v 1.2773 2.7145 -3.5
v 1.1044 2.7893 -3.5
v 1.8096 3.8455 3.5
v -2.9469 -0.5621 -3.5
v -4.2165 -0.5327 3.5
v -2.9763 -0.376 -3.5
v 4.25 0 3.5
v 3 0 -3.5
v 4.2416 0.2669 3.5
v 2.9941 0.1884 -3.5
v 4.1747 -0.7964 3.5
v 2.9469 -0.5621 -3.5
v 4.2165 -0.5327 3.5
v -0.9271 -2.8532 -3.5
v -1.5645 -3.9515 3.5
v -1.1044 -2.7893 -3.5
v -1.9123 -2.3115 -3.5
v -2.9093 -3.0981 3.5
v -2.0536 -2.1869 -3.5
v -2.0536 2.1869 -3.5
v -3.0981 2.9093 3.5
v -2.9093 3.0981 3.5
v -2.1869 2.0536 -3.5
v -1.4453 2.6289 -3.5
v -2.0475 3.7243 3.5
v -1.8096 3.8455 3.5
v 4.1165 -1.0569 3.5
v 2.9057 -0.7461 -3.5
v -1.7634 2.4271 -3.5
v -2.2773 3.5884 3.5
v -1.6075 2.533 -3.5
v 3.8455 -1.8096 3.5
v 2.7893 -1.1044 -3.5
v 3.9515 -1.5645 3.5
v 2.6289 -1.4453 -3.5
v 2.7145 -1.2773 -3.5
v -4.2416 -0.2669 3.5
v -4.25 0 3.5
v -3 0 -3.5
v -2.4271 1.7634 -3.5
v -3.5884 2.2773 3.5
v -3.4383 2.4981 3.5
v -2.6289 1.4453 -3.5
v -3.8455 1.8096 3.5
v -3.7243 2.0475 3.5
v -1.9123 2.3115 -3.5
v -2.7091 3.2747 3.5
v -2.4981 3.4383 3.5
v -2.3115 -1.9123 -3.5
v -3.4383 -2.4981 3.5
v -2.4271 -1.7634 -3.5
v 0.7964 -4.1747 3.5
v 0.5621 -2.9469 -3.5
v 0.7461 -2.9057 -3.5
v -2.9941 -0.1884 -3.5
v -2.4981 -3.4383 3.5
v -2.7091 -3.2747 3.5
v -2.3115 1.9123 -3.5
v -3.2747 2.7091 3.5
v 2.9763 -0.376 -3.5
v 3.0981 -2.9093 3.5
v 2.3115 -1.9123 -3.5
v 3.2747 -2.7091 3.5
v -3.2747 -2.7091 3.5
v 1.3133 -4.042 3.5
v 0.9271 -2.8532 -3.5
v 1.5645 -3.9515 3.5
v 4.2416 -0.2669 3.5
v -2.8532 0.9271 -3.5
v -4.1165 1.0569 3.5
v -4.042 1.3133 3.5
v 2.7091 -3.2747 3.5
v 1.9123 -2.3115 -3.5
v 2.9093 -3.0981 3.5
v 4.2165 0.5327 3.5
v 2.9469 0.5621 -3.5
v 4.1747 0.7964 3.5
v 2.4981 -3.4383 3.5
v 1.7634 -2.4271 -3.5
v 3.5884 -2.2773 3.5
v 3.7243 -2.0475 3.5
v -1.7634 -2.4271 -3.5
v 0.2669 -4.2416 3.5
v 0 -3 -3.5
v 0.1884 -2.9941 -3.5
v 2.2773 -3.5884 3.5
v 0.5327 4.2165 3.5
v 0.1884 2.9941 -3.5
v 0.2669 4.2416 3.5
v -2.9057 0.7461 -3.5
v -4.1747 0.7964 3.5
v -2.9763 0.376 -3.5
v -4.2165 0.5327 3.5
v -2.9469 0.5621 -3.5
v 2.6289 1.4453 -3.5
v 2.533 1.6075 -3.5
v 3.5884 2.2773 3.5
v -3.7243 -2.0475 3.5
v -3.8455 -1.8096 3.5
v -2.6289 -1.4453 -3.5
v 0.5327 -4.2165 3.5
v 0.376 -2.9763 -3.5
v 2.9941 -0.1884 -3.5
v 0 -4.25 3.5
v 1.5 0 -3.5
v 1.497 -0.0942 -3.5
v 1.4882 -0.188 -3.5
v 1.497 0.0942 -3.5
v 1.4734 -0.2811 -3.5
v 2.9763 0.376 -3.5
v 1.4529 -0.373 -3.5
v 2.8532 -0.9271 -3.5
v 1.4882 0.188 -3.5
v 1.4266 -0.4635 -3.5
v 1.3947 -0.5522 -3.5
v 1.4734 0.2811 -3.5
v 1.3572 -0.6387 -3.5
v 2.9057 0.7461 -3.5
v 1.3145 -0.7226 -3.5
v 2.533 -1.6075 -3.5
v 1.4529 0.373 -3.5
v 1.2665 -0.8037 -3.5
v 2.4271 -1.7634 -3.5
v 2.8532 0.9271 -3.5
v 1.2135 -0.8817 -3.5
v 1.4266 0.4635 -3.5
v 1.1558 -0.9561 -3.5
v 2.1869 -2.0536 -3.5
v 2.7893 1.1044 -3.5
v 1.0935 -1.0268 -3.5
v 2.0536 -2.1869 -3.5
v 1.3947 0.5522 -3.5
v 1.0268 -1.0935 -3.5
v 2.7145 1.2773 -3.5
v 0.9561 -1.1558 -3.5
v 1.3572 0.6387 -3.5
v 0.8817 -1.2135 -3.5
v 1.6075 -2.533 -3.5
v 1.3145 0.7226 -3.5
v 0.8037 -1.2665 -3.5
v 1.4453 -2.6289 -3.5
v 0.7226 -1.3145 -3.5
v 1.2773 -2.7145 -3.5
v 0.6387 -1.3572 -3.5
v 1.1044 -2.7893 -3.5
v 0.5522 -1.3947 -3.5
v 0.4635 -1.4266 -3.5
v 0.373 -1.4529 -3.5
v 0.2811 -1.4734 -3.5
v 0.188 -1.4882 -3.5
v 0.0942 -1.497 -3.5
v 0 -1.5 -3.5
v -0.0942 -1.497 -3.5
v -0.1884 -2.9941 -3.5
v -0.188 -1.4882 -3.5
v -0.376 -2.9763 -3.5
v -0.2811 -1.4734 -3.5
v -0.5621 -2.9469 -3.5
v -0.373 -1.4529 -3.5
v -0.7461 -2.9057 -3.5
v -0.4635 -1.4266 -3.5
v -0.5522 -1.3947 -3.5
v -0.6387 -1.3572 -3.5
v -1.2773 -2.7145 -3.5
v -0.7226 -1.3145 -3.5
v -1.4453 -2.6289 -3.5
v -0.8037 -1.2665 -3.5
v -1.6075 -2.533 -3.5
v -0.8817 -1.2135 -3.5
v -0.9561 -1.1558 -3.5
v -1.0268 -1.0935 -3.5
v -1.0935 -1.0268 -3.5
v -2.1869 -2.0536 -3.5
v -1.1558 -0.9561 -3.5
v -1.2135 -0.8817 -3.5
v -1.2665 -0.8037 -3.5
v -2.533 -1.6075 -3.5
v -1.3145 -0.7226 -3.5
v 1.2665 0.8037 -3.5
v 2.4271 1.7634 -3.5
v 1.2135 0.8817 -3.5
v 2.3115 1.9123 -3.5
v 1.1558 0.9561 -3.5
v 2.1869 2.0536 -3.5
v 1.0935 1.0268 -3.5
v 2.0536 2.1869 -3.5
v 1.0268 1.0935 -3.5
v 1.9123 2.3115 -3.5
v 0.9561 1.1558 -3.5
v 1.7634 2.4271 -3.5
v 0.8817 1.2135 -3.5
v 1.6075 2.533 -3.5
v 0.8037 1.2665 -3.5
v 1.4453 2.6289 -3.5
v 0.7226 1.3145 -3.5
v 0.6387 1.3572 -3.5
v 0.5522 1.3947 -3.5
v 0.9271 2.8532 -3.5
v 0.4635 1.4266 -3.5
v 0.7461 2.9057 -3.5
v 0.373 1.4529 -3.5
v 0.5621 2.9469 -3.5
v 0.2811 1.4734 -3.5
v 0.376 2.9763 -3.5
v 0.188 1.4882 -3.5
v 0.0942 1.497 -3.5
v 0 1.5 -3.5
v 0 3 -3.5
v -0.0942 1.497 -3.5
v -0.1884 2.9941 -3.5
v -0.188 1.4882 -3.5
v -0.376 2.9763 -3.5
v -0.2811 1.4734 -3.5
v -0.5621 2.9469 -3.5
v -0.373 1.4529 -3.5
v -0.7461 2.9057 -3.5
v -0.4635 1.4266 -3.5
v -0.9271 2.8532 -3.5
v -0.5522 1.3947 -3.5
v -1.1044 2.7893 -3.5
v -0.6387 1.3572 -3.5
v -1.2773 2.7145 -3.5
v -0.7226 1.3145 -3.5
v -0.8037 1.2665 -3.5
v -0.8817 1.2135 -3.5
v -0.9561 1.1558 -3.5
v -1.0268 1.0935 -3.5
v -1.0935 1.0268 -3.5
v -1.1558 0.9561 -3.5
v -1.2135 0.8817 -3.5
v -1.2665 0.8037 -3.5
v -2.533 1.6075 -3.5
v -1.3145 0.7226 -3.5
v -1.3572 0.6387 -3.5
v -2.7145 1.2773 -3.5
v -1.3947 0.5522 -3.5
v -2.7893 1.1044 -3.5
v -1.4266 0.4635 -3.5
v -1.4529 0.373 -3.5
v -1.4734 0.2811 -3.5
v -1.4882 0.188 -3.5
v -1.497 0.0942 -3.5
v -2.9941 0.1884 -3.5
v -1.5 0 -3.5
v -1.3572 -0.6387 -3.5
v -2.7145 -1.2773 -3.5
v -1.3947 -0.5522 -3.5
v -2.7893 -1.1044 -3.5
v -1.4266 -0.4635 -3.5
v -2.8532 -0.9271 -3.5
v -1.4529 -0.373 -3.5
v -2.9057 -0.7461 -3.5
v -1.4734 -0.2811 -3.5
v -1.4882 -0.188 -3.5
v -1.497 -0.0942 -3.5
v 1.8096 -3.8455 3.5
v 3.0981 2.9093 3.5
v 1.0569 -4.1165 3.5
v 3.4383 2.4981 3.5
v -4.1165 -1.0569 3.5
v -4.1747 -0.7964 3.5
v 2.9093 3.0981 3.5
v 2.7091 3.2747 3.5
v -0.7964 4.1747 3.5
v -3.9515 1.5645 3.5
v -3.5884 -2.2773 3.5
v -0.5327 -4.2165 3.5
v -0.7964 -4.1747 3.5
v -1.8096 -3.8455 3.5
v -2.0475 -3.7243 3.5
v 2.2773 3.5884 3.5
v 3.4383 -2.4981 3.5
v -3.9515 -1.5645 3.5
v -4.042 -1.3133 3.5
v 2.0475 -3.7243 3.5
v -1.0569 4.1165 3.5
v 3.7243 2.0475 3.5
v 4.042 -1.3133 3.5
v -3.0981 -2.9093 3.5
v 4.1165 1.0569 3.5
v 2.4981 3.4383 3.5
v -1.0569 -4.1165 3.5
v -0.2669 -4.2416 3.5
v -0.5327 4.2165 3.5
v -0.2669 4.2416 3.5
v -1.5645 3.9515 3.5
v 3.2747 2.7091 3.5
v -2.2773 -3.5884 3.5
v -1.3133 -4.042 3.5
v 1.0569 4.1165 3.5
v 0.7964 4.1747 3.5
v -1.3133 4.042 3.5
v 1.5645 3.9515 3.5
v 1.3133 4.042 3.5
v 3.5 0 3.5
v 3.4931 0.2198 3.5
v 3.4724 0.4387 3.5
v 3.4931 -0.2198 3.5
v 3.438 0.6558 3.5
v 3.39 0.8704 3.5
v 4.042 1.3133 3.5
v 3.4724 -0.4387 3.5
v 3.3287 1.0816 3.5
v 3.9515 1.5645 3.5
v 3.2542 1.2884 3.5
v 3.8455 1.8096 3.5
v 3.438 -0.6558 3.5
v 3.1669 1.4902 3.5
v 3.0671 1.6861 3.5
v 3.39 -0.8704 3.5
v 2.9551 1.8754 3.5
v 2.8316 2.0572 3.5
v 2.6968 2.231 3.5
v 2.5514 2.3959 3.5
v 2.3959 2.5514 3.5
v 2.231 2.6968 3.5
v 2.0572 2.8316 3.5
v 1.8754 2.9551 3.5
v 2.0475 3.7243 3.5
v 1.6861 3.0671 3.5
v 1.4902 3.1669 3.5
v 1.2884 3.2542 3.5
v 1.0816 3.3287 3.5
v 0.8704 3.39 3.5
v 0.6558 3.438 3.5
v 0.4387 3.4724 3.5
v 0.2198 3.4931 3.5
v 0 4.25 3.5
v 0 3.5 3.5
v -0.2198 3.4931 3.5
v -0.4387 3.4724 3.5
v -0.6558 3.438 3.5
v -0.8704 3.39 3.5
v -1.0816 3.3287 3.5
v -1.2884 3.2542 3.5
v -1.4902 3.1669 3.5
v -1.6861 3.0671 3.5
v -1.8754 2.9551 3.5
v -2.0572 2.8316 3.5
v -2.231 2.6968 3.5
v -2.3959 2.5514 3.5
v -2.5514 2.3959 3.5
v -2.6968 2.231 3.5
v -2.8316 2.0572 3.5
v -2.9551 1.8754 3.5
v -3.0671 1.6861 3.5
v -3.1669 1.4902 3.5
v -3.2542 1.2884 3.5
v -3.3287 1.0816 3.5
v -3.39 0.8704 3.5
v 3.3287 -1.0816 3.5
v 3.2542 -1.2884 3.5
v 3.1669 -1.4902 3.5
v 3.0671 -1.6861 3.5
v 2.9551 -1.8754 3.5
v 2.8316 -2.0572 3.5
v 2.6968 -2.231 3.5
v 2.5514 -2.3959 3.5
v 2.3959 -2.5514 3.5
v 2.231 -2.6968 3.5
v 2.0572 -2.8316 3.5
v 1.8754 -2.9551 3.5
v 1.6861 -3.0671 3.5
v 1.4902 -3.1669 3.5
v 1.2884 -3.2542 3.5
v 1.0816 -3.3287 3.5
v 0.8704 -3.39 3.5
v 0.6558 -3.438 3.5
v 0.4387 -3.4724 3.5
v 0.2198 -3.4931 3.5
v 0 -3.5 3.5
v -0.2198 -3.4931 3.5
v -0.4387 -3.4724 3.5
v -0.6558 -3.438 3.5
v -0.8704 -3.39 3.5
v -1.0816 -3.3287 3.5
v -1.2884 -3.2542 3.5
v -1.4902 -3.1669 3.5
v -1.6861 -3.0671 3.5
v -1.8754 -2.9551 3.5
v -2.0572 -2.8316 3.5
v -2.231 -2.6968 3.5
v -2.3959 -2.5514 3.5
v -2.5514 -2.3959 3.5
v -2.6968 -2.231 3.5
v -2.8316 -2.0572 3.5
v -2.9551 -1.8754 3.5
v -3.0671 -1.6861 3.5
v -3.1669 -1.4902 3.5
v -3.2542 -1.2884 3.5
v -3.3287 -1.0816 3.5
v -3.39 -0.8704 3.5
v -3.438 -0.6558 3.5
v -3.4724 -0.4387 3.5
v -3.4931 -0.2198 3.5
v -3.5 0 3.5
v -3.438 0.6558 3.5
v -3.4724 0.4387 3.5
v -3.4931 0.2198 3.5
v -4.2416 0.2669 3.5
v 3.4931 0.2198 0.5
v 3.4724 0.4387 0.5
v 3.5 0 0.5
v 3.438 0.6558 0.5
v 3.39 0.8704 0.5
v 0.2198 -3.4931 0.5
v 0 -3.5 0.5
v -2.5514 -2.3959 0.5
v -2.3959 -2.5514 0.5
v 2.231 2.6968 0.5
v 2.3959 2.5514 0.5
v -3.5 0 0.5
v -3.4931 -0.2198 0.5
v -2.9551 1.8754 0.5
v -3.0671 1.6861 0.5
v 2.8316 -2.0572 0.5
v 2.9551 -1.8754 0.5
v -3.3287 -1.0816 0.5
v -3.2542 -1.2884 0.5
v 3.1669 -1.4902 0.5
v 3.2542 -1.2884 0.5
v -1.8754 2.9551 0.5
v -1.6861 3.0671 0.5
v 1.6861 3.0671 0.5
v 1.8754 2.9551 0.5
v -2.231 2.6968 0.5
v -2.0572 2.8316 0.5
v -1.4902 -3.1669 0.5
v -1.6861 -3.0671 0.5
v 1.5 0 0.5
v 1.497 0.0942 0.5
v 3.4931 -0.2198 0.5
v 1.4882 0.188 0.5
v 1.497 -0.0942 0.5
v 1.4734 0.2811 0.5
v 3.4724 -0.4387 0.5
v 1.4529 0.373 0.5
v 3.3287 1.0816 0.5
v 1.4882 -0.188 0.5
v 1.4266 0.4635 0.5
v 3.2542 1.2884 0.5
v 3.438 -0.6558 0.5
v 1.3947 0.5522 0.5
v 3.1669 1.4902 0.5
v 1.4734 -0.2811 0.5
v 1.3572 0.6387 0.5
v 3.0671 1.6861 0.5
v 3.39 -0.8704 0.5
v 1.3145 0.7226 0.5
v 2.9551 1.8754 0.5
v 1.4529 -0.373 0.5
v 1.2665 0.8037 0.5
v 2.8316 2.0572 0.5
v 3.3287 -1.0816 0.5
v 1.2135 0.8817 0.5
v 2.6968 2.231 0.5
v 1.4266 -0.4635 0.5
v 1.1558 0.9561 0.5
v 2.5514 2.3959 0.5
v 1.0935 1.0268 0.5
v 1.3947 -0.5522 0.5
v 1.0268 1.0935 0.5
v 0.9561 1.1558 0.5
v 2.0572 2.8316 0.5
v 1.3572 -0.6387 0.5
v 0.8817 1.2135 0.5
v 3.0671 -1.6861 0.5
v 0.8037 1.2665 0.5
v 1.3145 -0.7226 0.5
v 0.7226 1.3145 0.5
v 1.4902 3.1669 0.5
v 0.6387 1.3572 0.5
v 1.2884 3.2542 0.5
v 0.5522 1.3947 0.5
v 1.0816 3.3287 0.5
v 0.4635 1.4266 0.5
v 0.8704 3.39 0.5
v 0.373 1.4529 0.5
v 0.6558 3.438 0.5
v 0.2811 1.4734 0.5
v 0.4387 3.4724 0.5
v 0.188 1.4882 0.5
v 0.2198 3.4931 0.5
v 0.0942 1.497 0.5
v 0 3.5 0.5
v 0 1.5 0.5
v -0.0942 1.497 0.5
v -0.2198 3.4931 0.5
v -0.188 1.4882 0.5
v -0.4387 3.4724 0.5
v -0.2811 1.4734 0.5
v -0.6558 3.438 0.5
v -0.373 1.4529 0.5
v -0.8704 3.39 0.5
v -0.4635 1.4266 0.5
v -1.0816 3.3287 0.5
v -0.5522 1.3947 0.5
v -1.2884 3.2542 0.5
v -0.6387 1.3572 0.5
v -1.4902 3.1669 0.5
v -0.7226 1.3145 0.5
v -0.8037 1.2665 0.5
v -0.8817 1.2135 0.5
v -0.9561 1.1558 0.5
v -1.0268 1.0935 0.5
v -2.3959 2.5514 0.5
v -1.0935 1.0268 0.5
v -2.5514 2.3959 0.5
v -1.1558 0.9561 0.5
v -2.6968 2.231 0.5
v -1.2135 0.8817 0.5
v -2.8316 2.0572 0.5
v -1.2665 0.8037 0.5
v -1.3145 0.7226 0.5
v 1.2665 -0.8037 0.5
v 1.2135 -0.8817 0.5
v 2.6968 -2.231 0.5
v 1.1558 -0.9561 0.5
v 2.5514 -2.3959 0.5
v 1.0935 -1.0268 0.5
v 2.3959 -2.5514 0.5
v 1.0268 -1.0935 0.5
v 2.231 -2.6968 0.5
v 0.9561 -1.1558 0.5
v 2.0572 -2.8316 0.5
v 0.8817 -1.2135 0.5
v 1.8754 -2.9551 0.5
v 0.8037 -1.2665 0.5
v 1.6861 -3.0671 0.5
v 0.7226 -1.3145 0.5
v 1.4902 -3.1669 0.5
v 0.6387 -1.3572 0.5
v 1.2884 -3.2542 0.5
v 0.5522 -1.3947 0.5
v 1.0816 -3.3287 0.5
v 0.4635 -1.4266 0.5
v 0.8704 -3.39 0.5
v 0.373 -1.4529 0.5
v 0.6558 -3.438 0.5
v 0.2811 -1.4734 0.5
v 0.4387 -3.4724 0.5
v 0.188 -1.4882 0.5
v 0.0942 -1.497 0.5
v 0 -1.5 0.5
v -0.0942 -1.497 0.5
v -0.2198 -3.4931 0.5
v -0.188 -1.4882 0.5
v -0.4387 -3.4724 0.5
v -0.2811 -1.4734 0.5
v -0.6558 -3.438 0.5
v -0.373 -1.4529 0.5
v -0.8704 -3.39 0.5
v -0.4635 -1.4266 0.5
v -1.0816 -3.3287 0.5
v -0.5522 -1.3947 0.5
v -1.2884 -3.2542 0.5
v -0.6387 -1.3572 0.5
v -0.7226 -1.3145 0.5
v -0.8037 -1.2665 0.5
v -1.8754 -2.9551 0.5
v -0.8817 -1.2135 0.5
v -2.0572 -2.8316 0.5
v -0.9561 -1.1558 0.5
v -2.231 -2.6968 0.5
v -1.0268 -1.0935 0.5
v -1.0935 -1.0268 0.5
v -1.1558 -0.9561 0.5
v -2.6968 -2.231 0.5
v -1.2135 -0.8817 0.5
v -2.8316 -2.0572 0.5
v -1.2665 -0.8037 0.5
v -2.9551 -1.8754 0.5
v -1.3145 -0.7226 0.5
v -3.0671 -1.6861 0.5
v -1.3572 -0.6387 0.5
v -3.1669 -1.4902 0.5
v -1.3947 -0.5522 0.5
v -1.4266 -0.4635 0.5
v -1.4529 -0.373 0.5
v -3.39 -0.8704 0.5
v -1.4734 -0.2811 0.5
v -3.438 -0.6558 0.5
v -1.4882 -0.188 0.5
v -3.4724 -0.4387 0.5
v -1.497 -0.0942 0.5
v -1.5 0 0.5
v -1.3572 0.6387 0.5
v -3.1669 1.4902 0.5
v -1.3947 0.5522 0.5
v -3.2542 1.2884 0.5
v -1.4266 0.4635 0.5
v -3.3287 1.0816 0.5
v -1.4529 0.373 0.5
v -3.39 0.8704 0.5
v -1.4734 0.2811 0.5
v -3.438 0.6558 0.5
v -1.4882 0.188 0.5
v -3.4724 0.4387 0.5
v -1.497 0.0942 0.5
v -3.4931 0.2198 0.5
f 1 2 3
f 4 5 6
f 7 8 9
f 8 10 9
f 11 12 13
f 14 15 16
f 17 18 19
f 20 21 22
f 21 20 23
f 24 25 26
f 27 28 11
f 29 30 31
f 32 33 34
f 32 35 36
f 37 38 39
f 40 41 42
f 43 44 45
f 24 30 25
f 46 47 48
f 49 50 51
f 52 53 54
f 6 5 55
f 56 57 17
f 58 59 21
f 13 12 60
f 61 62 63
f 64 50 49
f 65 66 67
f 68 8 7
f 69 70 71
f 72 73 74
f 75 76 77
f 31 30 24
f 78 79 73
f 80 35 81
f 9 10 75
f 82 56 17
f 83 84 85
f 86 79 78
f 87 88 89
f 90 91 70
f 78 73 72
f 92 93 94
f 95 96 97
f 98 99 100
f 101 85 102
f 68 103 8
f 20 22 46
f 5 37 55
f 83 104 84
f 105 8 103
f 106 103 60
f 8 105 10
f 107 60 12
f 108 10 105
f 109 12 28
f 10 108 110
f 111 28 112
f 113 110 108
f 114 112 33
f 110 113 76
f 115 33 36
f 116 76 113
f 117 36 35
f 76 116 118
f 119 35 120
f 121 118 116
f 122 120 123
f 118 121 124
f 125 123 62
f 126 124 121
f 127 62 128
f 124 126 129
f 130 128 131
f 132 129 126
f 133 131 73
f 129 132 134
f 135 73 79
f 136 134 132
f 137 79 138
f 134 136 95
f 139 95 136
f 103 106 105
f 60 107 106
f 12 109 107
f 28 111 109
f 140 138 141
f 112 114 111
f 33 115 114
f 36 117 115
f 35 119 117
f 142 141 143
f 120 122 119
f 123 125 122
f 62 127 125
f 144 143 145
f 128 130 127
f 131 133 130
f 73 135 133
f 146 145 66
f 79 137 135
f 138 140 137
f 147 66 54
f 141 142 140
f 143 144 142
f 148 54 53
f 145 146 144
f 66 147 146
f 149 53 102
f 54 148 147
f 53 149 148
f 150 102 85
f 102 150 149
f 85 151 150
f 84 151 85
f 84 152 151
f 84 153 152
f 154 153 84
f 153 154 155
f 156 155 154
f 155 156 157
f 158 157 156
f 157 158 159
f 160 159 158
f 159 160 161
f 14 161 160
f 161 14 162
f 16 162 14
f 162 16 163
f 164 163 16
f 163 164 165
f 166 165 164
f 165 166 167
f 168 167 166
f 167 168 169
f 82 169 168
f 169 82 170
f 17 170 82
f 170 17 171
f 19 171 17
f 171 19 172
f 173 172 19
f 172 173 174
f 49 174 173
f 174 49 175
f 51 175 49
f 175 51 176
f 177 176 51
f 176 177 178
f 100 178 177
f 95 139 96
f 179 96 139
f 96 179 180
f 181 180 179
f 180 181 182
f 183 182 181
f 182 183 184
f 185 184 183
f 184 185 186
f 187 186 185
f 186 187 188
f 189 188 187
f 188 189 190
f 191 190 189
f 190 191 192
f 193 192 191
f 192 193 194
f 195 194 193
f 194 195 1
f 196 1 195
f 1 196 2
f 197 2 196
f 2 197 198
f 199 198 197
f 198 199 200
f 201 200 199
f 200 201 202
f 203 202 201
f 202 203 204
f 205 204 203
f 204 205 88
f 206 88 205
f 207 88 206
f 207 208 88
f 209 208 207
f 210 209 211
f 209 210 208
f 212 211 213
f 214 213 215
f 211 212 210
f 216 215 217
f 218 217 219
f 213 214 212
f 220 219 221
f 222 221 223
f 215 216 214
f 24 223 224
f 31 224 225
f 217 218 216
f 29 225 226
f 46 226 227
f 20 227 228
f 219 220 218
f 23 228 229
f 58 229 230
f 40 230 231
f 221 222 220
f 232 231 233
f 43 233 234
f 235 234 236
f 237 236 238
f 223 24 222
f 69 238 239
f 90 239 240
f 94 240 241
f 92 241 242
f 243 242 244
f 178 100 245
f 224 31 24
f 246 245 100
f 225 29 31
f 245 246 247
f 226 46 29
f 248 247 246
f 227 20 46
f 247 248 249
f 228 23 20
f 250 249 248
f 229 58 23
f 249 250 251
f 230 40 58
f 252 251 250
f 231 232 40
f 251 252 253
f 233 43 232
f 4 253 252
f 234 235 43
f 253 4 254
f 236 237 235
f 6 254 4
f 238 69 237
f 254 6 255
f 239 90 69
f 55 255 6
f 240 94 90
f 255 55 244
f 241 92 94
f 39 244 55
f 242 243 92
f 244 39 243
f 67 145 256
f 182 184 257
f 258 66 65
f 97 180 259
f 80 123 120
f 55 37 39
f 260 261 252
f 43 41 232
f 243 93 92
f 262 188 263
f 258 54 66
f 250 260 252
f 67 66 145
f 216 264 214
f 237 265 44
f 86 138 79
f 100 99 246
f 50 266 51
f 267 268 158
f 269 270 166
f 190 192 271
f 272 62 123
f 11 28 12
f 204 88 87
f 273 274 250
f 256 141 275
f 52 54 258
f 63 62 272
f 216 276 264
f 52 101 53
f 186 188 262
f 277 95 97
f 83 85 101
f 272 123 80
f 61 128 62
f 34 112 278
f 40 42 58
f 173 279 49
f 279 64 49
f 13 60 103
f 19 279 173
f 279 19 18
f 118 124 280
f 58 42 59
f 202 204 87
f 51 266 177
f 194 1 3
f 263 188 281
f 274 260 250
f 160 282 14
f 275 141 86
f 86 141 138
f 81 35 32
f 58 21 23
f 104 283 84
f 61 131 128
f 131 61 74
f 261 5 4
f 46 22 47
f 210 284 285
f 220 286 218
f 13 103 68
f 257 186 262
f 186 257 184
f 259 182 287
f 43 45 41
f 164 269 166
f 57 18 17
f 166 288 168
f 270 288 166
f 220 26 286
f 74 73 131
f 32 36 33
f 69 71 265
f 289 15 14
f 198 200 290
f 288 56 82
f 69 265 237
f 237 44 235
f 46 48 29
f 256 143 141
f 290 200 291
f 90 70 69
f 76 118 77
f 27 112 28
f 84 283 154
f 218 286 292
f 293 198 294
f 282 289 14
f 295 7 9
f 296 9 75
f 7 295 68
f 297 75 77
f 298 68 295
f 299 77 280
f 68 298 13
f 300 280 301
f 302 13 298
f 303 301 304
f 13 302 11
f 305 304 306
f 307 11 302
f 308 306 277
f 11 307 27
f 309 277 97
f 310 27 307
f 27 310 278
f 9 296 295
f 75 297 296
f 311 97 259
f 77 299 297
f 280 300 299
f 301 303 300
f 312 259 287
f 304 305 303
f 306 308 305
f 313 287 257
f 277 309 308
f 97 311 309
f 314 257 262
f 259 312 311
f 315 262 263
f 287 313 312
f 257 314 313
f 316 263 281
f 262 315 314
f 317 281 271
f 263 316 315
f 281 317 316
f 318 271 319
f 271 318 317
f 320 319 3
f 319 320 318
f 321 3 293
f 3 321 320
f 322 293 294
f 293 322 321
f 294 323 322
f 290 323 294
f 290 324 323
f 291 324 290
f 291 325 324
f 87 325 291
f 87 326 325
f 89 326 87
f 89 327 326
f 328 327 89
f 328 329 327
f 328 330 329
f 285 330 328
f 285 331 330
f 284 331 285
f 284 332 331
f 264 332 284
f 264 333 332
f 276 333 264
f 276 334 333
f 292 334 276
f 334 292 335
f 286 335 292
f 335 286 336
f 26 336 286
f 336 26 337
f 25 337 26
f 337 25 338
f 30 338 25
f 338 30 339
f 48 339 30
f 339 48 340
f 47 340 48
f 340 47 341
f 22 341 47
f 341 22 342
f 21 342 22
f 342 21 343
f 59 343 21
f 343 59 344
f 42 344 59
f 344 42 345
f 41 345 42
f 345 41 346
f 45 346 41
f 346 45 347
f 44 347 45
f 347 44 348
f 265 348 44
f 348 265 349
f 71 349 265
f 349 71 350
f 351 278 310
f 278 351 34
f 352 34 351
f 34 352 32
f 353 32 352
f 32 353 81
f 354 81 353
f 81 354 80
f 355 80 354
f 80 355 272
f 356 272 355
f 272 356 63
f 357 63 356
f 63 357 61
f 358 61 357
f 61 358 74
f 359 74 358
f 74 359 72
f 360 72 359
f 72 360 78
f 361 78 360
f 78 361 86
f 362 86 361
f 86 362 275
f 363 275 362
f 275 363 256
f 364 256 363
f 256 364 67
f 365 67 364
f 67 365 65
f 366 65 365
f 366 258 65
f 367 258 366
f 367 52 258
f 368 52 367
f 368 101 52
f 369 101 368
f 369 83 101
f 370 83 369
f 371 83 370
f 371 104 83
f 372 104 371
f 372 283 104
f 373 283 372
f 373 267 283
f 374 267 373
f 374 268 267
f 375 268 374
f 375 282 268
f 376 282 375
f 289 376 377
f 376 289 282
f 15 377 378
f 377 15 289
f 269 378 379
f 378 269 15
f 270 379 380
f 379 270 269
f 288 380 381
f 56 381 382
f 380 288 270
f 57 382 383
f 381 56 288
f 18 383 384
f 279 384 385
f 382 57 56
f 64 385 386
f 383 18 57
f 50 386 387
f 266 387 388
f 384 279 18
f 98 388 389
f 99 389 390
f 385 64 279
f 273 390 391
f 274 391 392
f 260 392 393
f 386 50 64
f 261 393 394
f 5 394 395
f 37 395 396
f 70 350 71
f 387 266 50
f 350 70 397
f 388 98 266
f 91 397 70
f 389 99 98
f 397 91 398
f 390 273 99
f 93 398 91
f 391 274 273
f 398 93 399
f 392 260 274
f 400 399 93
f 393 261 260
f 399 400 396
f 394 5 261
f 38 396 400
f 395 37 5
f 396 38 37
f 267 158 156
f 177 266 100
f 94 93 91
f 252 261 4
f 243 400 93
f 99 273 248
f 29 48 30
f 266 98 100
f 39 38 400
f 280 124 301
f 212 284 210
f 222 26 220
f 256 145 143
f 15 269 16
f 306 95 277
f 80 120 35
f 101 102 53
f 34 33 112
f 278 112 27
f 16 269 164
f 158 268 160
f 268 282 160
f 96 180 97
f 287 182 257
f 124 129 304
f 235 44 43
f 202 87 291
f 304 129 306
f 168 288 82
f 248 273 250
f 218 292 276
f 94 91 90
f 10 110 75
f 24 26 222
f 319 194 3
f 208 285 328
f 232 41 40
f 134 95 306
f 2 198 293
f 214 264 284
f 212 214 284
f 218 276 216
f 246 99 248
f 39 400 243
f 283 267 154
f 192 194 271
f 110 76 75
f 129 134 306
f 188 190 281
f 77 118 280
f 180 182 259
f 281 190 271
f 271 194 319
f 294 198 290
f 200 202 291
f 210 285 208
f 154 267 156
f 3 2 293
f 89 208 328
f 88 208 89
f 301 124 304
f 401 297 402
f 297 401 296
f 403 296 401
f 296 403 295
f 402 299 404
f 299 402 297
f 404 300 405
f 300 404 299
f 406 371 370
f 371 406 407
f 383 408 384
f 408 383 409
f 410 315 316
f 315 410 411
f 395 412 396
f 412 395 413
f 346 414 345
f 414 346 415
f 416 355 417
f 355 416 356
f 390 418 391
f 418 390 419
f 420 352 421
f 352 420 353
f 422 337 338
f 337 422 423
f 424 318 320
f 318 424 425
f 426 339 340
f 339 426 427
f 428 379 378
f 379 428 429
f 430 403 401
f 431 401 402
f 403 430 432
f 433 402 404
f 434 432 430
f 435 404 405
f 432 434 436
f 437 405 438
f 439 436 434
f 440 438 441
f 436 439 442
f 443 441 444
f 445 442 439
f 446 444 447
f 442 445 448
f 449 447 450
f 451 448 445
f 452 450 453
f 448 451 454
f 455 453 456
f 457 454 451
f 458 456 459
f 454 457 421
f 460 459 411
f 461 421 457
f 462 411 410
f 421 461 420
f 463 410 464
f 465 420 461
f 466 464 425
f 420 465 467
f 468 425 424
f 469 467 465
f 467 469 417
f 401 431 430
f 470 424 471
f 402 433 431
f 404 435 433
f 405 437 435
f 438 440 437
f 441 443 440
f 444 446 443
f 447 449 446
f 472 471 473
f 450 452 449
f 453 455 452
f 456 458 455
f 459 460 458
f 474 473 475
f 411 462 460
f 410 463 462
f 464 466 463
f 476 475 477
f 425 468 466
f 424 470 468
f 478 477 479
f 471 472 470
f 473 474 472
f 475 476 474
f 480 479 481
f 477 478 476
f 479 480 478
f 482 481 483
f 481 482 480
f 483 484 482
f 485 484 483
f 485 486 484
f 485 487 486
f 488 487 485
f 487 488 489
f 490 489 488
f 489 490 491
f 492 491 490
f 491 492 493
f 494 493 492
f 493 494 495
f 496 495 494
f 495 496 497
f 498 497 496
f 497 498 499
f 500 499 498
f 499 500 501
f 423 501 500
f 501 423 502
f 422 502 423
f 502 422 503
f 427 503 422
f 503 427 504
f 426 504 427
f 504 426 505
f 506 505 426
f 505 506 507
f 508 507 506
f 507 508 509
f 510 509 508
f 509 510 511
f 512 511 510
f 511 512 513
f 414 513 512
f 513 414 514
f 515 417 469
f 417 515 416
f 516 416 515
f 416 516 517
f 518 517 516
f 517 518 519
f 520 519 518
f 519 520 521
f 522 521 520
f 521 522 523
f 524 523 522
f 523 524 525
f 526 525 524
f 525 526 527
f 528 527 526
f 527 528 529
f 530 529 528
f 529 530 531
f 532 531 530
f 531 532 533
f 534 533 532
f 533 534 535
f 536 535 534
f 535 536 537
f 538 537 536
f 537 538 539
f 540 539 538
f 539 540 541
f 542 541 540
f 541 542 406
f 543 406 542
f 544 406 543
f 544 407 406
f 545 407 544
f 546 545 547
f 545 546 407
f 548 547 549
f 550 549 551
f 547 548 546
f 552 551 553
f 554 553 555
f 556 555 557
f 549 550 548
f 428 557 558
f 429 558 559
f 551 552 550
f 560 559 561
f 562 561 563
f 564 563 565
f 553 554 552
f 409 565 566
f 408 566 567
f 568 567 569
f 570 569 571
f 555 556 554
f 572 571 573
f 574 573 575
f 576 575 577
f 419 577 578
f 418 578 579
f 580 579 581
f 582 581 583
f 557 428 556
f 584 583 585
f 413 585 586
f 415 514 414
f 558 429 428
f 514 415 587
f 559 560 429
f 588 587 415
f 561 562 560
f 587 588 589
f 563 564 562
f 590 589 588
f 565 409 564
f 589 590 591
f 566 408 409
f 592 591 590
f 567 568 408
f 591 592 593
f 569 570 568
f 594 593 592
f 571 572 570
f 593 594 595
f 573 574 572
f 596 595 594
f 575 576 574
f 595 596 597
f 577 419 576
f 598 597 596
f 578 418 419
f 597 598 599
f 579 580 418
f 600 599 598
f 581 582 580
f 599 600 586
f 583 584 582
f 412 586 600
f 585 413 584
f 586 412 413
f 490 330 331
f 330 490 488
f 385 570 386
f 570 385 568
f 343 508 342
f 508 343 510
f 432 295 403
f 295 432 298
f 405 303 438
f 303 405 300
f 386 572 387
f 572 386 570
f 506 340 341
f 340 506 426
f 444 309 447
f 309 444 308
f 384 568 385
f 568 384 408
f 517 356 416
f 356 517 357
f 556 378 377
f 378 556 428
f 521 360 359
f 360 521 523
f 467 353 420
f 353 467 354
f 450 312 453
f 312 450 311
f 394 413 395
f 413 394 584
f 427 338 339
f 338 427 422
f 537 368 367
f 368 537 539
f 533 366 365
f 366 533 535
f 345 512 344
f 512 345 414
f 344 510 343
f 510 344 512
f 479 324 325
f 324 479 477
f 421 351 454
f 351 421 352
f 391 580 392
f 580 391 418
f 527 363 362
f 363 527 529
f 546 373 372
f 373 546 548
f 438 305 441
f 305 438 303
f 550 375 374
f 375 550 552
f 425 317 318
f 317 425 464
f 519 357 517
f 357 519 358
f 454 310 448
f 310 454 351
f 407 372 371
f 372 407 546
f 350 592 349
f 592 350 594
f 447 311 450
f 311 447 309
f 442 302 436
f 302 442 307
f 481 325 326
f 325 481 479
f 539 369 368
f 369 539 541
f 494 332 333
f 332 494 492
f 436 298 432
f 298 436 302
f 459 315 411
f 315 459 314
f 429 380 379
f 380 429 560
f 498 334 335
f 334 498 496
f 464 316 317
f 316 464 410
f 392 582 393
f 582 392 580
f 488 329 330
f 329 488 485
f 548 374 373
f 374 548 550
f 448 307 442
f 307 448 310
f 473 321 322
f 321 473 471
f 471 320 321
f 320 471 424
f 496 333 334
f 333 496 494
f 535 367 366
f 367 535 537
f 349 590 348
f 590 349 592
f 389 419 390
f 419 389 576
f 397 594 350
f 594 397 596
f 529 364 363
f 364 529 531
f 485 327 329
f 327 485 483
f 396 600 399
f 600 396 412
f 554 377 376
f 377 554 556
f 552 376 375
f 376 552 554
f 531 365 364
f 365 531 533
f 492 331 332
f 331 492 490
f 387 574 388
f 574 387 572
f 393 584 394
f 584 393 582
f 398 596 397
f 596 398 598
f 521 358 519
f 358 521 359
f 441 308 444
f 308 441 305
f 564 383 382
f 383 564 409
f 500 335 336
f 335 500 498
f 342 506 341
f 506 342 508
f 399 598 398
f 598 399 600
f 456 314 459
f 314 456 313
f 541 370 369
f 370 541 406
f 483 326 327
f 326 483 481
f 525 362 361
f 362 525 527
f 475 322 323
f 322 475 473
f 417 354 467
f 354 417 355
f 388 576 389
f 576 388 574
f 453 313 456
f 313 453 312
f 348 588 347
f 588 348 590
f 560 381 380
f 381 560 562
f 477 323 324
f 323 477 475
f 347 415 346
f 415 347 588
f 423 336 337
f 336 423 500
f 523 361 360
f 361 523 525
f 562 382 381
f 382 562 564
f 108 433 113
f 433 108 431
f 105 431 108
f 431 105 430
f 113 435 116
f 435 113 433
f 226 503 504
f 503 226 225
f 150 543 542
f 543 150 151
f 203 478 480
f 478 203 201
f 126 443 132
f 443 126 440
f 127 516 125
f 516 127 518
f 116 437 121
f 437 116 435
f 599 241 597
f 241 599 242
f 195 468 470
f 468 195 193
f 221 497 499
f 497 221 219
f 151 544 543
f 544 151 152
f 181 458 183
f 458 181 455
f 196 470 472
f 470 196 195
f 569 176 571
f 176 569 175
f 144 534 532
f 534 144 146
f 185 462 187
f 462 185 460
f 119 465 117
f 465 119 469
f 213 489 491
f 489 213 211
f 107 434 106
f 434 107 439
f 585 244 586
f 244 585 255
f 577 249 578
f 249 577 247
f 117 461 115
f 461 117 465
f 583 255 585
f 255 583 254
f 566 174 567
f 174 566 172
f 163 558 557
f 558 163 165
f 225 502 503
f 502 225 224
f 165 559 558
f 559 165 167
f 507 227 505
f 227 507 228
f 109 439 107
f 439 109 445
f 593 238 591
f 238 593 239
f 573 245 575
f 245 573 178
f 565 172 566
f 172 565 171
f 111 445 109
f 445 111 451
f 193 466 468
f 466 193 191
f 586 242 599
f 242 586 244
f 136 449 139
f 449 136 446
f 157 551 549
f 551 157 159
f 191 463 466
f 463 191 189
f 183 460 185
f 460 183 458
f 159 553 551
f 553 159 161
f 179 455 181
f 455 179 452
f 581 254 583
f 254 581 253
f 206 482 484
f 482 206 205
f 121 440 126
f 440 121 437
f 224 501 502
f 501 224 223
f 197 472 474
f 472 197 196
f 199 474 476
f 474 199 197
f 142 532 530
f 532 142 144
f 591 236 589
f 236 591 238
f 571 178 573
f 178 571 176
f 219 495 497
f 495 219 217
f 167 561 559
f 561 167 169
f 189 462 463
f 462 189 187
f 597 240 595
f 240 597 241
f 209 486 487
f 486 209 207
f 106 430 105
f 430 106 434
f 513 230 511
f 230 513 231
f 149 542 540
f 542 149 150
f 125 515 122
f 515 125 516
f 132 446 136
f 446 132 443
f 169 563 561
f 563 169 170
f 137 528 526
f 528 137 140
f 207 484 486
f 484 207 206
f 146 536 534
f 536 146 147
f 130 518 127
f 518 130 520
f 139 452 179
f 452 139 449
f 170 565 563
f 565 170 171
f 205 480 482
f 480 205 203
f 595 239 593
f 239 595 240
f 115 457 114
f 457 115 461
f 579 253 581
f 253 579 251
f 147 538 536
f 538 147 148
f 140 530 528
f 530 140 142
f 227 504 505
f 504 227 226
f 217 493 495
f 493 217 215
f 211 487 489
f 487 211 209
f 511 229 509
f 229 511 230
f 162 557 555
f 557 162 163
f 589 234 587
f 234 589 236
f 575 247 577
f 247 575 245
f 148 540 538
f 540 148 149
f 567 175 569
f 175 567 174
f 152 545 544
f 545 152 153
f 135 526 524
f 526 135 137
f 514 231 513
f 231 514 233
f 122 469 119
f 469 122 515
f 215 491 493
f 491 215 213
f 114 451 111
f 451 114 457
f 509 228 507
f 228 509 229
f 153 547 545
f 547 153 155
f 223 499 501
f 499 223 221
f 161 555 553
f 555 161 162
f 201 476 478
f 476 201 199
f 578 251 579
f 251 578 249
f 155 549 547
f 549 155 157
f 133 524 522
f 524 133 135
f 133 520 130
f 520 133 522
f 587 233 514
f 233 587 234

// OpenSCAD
// file: ../roundedcube.scad
// Higher definition curves
$fs = 0.01;

module roundedcube(size = [1, 1, 1], center = false, radius = 0.5, apply_to = "all") {
	// If single value, convert to [x, y, z] vector
	size = (size[0] == undef) ? [size, size, size] : size;

	translate_min = radius;
	translate_xmax = size[0] - radius;
	translate_ymax = size[1] - radius;
	translate_zmax = size[2] - radius;

	diameter = radius * 2;

	module build_point(type = "sphere", rotate = [0, 0, 0]) {
		if (type == "sphere") {
			sphere(r = radius);
		} else if (type == "cylinder") {
			rotate(a = rotate)
			cylinder(h = diameter, r = radius, center = true);
		}
	}

	obj_translate = (center == false) ?
		[0, 0, 0] : [
			-(size[0] / 2),
			-(size[1] / 2),
			-(size[2] / 2)
		];

	translate(v = obj_translate) {
		hull() {
			for (translate_x = [translate_min, translate_xmax]) {
				x_at = (translate_x == translate_min) ? "min" : "max";
				for (translate_y = [translate_min, translate_ymax]) {
					y_at = (translate_y == translate_min) ? "min" : "max";
					for (translate_z = [translate_min, translate_zmax]) {
						z_at = (translate_z == translate_min) ? "min" : "max";

						translate(v = [translate_x, translate_y, translate_z])
						if (
							(apply_to == "all") ||
							(apply_to == "xmin" && x_at == "min") || (apply_to == "xmax" && x_at == "max") ||
							(apply_to == "ymin" && y_at == "min") || (apply_to == "ymax" && y_at == "max") ||
							(apply_to == "zmin" && z_at == "min") || (apply_to == "zmax" && z_at == "max")
						) {
							build_point("sphere");
						} else {
							rotate =
								(apply_to == "xmin" || apply_to == "xmax" || apply_to == "x") ? [0, 90, 0] : (
								(apply_to == "ymin" || apply_to == "ymax" || apply_to == "y") ? [90, 90, 0] :
								[0, 0, 0]
							);
							build_point("cylinder", rotate);
						}
					}
				}
			}
		}
	}
}

module roundedcubez(size = [1, 1, 1], center = false, radius = 0.5, apply_to = "all") {
	intersection() {
		roundedcube(size, center, radius, apply_to="z");
		scale([1.0, 1.0, 1.1])
			cube(size, center);
	}
}

// The good stuff!!!!  Forget about the whack stuff above.
// centered on XY only
module cube_(size=[1, 1, 1])
	translate([-size[0] / 2, -size[1] / 2, 0])
		cube(size);

// centered on XY only
module roundedcubez_(size = [1, 1, 1], radius = 0.5) {
	linear_extrude(height=size[2]) {
		square([size[0] - 2 * radius, size[1]], center=true);
		square([size[0], size[1] - 2 * radius], center=true);
		for (i=[-1, 1])
			for (j=[-1, 1])
				translate([i * (size[0] / 2 - radius), j * (size[1] / 2 - radius), 0])
					circle(r = radius);
	}
}
// main file
$fn = $preview ? 30 : 100;

include <../roundedcube.scad>

module magnet_holder() {
	difference() {
		cylinder(h=7, d1=6, d2=8.5, center=true);
		translate([0, 0, 6.5 - 3])
			cylinder(h=6, d=7, center=true);
		cylinder(h=8, d=3, center=true);
	}
}


module button() {
	difference() {
		union() {
			cylinder(h=3, d1=6, d2=6, center=true);
			translate([0, 0, 1.5])
				difference() {
					sphere(r=6 / 2);
					translate([0, 0, -5])
						cube(size=[10, 10, 10], center=true);
				}
		}
		cylinder(h=7, d=2.9, center=true);
	}
}

module trigger_clamp() {
	h_clamp = 12;
	color("yellow")
	difference() {
		union() {
			cylinder(h=h_clamp, d=35, center=true);
			// little arm
			translate([0, -20.25, 0])
				roundedcubez([6.5, 20, h_clamp], radius=6.5/2, center=true);
		}
		// zip tie ring
		difference() {
			// outer diameter
			cylinder(h=6, d=36, center=true);
			// inner diameter
			cylinder(h=8, d=36 - 4, center=true);
		}
		// make space for zip tie head
		difference() {
			// outer diameter
			cylinder(h=h_clamp + 1, d=36, center=true);
			cylinder(h=h_clamp + 2, d=32, center=true);
			translate([0, -10, 0])
				cube(size=[50, 50, 20], center=true);
		}

		// big central hole
		cylinder(h=13, d=25.5, center=true);
		// slot for clamping
		cube(size=[40, 1, 40], center=true);
		// hole for carbon stick
		translate([0, -12 - 15, 0])
			cylinder(h=h_clamp + 1, d=4.6, center=true);
	}

	h_spring = 17;
	// h_spring = 9;

	// carbon stick
	// color("black")
	// 	translate([0, -12 - 15, -9 + 17 - h_spring])
	// 		cylinder(h=37, d=2.45, center=true);

	// Magnet holder
	// color("blue")
	// 	translate([0, -12 - 15, 9.5 + 17 - h_spring])
	// 		magnet_holder();

	// spring
	// color("white", alpha=0.3)
	// 	translate([0, -12 - 15, -6 - h_spring / 2])
	// 		cylinder(h=h_spring, d=4.3, center=true);

	// button end-cap
	// color("blue")
	// 	translate([0, -12 - 15, -24.5 + 17 - h_spring])
	// 		rotate([180, 0, 0])
	// 			button();

}


// export
// intersection() {
// 	trigger_clamp();
// 	translate([0, -50, 0])
// 		cube(size=[100, 100, 100], center=true);
// }

// button();

magnet_holder();
